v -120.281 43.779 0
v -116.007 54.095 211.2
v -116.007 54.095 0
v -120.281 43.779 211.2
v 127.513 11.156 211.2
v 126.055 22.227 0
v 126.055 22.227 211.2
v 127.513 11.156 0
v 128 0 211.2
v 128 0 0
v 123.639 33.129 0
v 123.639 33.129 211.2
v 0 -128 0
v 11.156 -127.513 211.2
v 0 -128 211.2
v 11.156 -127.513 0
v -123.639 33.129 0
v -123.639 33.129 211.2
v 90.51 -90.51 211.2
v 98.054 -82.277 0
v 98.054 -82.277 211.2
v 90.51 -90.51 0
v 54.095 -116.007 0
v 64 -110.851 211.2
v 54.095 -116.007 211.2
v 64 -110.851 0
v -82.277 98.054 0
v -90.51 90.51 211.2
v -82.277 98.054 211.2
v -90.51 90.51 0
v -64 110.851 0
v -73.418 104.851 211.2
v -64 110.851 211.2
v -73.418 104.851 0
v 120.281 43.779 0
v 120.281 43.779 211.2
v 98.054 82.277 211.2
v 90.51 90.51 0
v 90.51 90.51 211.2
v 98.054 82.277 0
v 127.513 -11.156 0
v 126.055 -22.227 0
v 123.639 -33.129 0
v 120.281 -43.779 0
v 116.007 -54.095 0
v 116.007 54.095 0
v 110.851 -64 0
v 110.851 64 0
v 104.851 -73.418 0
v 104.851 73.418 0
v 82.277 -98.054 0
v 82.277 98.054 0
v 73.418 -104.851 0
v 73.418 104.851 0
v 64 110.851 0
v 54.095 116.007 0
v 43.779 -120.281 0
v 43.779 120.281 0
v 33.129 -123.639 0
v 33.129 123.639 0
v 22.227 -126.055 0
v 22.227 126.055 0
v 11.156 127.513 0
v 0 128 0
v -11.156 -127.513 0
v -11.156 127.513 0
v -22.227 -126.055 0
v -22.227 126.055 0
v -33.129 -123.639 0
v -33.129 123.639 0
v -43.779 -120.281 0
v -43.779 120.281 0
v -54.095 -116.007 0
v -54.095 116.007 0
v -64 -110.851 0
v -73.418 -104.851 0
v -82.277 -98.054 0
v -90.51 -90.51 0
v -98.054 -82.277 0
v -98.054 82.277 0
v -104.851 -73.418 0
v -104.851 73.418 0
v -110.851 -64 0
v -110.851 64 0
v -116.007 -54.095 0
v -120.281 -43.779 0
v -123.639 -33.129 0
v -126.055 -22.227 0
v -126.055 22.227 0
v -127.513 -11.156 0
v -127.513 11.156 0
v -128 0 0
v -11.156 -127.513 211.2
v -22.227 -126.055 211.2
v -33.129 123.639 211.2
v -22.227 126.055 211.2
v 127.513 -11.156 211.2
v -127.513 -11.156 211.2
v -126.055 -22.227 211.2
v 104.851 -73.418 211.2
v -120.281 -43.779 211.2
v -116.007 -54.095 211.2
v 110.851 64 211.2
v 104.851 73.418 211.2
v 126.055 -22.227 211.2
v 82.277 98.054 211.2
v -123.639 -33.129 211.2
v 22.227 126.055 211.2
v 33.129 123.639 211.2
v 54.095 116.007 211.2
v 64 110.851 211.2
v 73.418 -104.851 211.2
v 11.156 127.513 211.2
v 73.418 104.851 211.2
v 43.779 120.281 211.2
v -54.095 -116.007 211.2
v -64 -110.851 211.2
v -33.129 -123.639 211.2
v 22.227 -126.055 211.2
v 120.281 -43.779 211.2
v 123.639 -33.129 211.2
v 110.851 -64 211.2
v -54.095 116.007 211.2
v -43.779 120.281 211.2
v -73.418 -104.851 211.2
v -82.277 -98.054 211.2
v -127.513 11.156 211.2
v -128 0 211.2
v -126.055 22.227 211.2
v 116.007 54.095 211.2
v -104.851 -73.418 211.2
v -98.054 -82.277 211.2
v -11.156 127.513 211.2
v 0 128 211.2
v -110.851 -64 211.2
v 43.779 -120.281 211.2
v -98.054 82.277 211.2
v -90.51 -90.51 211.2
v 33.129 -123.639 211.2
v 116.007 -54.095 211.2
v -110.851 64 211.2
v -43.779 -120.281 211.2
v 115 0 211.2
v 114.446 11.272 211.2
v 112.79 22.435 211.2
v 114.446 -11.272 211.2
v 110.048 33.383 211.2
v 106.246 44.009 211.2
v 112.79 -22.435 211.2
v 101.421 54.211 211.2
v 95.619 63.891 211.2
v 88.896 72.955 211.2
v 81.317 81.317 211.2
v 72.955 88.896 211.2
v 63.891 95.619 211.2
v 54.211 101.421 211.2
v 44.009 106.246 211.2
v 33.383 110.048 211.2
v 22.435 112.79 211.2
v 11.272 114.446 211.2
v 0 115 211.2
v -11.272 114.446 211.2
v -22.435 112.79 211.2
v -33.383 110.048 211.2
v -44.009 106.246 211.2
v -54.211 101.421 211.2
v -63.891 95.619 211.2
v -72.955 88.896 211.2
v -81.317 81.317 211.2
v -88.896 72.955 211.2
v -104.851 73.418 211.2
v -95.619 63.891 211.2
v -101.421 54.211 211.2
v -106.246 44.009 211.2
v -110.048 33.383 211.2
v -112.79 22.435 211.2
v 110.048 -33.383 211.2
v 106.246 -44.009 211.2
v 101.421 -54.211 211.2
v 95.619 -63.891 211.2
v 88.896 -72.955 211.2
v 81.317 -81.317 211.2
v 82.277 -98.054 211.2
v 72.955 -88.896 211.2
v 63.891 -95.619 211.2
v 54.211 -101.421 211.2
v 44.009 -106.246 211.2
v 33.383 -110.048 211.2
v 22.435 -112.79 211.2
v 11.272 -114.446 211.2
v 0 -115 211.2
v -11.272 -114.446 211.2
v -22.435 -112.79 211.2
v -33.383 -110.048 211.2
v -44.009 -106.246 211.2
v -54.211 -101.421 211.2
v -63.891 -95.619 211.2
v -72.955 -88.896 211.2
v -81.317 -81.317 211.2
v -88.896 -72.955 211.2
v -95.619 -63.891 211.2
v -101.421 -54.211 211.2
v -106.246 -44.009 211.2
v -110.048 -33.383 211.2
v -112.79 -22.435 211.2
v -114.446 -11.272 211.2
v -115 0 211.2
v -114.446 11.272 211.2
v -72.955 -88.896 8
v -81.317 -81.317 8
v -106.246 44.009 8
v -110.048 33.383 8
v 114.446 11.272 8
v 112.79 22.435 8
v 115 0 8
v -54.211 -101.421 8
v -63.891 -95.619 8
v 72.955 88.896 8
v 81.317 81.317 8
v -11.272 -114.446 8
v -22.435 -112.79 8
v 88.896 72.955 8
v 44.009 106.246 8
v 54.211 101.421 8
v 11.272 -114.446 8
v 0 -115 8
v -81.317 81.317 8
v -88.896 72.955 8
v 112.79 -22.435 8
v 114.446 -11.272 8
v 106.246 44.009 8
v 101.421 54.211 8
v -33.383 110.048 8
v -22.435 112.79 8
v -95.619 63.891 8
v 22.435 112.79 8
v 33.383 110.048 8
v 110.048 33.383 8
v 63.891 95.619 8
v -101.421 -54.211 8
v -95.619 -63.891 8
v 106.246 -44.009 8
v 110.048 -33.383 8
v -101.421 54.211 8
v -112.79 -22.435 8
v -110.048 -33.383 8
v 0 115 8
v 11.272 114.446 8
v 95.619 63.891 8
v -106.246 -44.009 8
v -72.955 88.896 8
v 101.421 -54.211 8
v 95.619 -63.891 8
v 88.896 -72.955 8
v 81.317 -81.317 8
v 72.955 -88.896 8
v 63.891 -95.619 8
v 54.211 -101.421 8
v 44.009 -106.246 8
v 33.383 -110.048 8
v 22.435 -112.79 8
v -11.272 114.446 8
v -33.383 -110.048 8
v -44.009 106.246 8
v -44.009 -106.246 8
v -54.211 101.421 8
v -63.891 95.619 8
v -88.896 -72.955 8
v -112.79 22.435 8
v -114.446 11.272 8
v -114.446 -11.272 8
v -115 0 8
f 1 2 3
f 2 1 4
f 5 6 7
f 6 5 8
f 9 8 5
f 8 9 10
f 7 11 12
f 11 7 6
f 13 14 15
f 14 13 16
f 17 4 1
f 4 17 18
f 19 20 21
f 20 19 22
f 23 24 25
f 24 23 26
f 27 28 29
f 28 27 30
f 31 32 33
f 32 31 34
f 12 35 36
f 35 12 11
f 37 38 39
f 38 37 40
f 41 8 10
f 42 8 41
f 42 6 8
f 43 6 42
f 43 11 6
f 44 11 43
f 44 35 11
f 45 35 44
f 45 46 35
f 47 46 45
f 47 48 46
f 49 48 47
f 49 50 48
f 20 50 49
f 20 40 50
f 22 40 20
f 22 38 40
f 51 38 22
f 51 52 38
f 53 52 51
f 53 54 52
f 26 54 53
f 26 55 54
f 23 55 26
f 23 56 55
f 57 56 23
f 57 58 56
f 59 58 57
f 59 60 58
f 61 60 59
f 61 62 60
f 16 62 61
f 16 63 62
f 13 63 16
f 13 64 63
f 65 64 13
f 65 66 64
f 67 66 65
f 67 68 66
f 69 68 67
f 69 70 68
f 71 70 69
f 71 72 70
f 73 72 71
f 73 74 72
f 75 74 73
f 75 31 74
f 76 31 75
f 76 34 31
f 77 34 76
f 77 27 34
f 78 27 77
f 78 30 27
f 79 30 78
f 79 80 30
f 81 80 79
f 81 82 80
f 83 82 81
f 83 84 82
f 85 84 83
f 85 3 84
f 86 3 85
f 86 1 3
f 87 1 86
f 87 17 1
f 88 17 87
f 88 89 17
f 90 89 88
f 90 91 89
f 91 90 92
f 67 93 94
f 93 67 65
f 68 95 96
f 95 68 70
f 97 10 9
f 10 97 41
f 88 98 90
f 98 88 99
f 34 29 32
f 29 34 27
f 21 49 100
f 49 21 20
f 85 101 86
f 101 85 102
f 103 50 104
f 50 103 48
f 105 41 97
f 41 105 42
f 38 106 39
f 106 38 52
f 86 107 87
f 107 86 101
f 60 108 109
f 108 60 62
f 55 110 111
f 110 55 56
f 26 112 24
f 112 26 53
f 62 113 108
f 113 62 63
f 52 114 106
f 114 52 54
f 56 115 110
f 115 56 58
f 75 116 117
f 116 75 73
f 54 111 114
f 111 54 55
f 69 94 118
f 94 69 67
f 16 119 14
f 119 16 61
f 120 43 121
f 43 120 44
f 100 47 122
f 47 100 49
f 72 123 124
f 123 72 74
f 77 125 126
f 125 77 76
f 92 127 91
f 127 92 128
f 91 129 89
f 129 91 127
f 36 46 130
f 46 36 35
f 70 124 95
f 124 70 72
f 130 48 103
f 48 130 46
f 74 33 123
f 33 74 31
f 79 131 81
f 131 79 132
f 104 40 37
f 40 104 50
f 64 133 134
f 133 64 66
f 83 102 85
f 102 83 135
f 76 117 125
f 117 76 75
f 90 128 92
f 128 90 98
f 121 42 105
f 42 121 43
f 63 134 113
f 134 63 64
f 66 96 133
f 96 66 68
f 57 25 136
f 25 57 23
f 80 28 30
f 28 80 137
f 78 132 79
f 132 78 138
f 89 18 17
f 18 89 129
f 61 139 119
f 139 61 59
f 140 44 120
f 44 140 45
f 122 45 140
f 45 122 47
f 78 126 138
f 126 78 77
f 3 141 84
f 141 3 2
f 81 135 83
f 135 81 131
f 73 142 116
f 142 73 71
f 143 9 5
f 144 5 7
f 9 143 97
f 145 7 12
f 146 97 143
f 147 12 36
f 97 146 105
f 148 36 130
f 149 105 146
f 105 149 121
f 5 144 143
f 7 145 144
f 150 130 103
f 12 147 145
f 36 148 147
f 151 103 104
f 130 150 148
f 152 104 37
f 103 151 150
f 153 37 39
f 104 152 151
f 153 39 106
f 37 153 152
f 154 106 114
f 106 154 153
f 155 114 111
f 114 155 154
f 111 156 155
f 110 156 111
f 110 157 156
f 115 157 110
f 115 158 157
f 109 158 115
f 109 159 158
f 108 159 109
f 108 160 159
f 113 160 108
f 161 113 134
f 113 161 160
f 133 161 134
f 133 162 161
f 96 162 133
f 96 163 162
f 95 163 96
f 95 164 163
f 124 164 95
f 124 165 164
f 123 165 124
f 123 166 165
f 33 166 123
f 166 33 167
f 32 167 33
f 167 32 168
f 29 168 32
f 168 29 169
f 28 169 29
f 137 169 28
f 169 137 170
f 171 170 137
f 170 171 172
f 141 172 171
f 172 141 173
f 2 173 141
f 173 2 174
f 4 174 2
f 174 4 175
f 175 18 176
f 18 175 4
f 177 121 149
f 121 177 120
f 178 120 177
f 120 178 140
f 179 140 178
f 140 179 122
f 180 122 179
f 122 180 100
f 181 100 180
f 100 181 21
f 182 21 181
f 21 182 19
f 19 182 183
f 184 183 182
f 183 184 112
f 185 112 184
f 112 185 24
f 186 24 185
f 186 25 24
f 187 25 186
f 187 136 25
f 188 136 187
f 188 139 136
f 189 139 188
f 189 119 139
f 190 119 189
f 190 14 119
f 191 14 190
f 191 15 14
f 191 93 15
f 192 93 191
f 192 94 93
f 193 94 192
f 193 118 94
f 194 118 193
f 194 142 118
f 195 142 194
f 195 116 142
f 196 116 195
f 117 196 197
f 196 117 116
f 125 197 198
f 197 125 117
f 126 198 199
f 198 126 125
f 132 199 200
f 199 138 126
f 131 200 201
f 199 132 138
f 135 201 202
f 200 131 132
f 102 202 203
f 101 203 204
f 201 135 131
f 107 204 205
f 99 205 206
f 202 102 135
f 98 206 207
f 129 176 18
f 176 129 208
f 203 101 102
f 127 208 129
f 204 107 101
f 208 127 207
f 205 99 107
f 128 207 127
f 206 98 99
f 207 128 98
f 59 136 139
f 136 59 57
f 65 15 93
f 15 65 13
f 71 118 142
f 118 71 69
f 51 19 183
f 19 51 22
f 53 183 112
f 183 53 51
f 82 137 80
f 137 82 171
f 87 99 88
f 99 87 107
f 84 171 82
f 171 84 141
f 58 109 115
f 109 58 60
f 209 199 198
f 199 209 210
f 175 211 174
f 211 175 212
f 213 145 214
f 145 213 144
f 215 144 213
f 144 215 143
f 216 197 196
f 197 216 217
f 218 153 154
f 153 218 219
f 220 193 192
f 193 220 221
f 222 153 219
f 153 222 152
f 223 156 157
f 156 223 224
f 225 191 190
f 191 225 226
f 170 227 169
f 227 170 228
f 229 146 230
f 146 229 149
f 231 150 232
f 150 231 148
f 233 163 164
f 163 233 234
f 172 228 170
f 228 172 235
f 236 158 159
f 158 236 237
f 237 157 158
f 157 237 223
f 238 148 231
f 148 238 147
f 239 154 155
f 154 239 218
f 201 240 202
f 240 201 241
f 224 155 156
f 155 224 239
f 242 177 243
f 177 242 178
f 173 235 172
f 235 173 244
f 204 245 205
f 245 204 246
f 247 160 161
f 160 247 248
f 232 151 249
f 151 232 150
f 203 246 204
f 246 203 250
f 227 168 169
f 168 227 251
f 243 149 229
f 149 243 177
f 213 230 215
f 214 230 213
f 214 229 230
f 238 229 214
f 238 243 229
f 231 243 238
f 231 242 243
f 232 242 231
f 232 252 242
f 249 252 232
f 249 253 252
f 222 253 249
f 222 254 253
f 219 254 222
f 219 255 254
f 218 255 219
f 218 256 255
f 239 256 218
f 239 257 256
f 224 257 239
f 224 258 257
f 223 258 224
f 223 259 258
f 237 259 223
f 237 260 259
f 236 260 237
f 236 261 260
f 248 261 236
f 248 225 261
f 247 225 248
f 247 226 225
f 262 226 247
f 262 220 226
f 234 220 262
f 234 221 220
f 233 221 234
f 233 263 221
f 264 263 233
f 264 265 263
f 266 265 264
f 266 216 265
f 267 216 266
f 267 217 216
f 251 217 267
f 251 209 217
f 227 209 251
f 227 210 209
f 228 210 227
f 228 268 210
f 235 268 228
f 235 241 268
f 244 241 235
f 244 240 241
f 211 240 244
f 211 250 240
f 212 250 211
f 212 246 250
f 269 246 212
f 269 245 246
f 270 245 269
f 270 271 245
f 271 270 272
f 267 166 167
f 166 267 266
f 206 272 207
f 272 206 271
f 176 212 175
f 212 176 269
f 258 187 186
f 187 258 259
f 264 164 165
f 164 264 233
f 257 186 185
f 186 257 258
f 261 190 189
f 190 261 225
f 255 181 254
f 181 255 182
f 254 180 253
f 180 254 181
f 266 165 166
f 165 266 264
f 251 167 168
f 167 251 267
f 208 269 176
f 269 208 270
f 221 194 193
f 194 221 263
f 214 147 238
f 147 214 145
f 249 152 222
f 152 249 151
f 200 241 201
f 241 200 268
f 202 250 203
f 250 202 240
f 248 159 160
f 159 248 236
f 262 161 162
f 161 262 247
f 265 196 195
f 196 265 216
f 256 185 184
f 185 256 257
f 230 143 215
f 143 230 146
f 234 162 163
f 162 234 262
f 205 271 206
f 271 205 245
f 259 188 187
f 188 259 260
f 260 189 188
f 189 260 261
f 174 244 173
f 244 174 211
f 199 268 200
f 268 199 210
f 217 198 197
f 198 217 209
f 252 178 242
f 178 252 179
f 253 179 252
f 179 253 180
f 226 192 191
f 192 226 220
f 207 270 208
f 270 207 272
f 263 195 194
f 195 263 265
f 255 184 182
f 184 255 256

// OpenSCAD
// file: lib/generated_constants.scad
// AUTO-GENERATED from simulation/sizing.py — do not hand edit
P_target_W = 10.0;
A_mem_m2 = 0.72;
active_w = 200.0;
active_h = 300.0;
n_plates = 12;
housing_od = 280.0;
housing_len = 264;
bolt_circle = 240.0;
frame_L = 664;
frame_W = 480.0;
frame_H = 900;
delta_P_bar = 34.58;
plate_pitch = 12;
// main file
// v2 RED nanopore cartridge — same flange as PRO housing
include <lib/generated_constants.scad>

module red_cartridge_v2() {
  difference() {
    cylinder(h=housing_len*0.8, d=housing_od - 24, $fn=72);
    translate([0, 0, 8]) cylinder(h=housing_len, d=housing_od - 50, $fn=64);
    // nanopore field pattern (visual)
    for (z = [20:15:housing_len*0.6])
      for (a = [0:30:330])
        rotate([0, 0, a]) translate([housing_od/2 - 30, 0, z])
          cylinder(h=3, d=2, $fn=8);
  }
}
red_cartridge_v2();
